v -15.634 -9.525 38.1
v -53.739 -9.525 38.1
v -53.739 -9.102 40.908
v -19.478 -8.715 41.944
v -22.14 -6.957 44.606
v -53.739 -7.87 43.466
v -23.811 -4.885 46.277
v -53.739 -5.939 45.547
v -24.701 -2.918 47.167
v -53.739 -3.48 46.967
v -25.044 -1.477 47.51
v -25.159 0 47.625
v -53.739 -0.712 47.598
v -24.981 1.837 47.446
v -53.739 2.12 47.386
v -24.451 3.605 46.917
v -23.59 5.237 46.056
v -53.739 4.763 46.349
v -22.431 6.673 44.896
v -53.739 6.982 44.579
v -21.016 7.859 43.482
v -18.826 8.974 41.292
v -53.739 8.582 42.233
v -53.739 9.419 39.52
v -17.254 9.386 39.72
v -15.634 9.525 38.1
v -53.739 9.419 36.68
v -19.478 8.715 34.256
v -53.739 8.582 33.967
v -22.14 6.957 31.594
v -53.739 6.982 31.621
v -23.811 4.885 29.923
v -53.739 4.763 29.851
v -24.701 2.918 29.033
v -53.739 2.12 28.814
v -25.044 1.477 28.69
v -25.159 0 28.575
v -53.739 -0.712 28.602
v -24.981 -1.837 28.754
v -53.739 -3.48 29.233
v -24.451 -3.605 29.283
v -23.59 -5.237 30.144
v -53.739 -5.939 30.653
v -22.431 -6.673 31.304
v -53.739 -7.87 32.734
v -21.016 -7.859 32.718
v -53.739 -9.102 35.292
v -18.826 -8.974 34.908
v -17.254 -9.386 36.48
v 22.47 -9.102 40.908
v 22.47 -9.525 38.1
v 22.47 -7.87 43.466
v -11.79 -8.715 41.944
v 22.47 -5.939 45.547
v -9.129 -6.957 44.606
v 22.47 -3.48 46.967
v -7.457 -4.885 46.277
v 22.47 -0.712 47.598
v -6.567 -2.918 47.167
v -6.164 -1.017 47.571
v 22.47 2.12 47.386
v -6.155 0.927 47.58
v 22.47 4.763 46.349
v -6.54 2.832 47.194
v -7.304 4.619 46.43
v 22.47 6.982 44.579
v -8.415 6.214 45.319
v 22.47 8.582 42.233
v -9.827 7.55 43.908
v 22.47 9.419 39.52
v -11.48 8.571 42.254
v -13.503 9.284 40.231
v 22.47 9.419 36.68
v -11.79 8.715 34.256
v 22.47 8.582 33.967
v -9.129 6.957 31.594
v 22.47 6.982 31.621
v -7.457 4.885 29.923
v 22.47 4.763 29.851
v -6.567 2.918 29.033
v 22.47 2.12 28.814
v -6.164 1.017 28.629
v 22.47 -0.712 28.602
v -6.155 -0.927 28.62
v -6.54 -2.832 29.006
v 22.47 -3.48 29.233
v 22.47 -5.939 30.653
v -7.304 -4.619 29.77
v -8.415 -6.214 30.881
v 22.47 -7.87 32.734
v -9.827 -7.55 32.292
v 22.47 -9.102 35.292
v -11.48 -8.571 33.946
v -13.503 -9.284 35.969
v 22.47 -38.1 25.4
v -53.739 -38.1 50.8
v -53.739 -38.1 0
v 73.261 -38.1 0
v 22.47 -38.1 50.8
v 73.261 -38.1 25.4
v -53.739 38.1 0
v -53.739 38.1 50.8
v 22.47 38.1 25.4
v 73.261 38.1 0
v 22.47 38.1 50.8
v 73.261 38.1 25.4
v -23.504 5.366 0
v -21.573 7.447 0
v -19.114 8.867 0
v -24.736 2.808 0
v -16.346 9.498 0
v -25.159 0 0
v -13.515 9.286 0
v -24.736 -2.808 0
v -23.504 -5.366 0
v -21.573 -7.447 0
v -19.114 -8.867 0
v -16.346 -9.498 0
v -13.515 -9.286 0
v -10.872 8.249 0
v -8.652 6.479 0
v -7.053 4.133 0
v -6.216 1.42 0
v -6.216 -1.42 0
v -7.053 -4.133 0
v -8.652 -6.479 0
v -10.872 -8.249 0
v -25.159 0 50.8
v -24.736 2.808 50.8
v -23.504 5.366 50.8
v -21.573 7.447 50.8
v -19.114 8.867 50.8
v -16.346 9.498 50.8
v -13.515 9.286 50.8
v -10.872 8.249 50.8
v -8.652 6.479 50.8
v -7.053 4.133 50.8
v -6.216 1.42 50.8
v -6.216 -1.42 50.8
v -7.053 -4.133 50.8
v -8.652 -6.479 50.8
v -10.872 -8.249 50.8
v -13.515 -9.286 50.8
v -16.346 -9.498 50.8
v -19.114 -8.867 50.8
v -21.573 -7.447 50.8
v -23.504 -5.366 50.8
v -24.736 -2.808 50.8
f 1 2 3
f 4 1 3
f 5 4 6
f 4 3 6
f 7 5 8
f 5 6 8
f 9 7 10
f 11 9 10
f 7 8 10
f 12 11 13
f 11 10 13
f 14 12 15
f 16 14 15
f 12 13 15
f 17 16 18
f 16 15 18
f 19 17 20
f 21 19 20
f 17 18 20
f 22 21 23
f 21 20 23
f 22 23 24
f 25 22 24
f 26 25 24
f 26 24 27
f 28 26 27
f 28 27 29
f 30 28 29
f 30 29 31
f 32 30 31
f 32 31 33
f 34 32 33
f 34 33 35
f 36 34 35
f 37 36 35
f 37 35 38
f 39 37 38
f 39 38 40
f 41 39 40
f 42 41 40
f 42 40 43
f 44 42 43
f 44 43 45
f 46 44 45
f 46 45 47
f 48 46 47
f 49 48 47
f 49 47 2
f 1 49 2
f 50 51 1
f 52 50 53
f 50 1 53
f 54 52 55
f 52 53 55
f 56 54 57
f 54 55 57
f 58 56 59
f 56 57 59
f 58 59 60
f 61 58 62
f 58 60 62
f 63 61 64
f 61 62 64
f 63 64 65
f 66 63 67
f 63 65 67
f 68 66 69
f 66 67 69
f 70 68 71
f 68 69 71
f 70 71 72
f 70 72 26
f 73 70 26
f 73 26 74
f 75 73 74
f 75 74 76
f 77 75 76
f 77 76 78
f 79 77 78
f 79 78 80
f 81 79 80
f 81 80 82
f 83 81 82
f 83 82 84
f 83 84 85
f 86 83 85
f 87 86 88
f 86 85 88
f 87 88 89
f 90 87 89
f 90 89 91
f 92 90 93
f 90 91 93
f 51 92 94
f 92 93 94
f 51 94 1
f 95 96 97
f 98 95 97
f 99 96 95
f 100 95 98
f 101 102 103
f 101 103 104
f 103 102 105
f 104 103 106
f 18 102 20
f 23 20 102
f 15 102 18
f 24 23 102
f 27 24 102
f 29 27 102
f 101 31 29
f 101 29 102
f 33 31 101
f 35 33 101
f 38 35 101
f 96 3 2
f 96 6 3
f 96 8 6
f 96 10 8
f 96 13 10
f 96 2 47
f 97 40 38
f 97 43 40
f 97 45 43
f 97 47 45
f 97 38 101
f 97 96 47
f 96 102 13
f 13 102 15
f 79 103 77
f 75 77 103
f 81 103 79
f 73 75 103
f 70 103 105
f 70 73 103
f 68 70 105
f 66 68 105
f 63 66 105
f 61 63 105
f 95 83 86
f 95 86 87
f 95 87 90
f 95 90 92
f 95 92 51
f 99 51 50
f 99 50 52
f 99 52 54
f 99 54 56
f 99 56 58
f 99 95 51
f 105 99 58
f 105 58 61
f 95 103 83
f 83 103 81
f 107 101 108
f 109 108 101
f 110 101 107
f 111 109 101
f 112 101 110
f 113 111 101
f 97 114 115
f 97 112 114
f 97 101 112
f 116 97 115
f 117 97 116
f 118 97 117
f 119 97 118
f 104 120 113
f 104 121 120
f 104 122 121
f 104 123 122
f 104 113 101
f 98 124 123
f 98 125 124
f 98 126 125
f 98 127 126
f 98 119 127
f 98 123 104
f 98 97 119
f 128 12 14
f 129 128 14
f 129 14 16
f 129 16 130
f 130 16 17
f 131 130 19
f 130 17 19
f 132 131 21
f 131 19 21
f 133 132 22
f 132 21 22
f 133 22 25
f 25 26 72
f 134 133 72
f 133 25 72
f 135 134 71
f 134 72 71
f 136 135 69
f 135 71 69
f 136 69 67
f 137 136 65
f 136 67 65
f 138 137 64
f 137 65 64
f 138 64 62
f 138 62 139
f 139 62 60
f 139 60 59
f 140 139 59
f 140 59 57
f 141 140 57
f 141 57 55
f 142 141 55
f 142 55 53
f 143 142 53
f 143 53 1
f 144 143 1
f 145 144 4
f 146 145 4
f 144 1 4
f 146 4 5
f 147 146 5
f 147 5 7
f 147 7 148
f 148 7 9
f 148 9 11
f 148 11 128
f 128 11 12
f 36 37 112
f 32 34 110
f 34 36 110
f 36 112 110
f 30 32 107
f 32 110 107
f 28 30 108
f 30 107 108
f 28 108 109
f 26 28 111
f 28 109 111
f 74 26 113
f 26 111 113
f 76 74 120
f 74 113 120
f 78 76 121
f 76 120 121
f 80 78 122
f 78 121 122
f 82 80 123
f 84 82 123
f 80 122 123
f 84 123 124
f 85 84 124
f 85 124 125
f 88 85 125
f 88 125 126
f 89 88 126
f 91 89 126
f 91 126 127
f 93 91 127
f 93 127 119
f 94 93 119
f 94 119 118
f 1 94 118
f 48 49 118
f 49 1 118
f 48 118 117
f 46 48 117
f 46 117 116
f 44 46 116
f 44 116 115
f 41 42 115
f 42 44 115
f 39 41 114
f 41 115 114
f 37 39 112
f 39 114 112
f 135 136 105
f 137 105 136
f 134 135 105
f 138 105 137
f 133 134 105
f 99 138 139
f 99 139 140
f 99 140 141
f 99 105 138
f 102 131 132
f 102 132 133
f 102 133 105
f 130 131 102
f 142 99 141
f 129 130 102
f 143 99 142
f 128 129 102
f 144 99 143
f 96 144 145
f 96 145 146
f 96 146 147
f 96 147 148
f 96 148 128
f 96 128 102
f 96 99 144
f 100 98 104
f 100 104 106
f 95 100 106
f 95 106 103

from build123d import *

# Parameters (mm, degrees)
F1_DEPTH = 38.1
F3_D     = 19.05
F5_D     = 19.05


with BuildPart() as f1:
    # F0 (on Front) → F1 (new body, symmetric)
    with BuildSketch(Plane.XZ):
        Polygon((-53.739256, 50.8), (-53.739256, 0), (73.260744, 0), (73.260744, 25.4), (22.470463, 25.4), (22.470463, 50.8), align=None)
    extrude(amount=F1_DEPTH, both=True)

    # F3 (through all)
    with Locations(Plane.YZ.offset(22.470463)):
        with Locations((0, 38.1)):
            Hole(F3_D / 2)

    # F5 (through all)
    with Locations(Plane.XY.offset(50.8)):
        with Locations((-15.634397, 0)):
            Hole(F5_D / 2)


solid = f1.part
